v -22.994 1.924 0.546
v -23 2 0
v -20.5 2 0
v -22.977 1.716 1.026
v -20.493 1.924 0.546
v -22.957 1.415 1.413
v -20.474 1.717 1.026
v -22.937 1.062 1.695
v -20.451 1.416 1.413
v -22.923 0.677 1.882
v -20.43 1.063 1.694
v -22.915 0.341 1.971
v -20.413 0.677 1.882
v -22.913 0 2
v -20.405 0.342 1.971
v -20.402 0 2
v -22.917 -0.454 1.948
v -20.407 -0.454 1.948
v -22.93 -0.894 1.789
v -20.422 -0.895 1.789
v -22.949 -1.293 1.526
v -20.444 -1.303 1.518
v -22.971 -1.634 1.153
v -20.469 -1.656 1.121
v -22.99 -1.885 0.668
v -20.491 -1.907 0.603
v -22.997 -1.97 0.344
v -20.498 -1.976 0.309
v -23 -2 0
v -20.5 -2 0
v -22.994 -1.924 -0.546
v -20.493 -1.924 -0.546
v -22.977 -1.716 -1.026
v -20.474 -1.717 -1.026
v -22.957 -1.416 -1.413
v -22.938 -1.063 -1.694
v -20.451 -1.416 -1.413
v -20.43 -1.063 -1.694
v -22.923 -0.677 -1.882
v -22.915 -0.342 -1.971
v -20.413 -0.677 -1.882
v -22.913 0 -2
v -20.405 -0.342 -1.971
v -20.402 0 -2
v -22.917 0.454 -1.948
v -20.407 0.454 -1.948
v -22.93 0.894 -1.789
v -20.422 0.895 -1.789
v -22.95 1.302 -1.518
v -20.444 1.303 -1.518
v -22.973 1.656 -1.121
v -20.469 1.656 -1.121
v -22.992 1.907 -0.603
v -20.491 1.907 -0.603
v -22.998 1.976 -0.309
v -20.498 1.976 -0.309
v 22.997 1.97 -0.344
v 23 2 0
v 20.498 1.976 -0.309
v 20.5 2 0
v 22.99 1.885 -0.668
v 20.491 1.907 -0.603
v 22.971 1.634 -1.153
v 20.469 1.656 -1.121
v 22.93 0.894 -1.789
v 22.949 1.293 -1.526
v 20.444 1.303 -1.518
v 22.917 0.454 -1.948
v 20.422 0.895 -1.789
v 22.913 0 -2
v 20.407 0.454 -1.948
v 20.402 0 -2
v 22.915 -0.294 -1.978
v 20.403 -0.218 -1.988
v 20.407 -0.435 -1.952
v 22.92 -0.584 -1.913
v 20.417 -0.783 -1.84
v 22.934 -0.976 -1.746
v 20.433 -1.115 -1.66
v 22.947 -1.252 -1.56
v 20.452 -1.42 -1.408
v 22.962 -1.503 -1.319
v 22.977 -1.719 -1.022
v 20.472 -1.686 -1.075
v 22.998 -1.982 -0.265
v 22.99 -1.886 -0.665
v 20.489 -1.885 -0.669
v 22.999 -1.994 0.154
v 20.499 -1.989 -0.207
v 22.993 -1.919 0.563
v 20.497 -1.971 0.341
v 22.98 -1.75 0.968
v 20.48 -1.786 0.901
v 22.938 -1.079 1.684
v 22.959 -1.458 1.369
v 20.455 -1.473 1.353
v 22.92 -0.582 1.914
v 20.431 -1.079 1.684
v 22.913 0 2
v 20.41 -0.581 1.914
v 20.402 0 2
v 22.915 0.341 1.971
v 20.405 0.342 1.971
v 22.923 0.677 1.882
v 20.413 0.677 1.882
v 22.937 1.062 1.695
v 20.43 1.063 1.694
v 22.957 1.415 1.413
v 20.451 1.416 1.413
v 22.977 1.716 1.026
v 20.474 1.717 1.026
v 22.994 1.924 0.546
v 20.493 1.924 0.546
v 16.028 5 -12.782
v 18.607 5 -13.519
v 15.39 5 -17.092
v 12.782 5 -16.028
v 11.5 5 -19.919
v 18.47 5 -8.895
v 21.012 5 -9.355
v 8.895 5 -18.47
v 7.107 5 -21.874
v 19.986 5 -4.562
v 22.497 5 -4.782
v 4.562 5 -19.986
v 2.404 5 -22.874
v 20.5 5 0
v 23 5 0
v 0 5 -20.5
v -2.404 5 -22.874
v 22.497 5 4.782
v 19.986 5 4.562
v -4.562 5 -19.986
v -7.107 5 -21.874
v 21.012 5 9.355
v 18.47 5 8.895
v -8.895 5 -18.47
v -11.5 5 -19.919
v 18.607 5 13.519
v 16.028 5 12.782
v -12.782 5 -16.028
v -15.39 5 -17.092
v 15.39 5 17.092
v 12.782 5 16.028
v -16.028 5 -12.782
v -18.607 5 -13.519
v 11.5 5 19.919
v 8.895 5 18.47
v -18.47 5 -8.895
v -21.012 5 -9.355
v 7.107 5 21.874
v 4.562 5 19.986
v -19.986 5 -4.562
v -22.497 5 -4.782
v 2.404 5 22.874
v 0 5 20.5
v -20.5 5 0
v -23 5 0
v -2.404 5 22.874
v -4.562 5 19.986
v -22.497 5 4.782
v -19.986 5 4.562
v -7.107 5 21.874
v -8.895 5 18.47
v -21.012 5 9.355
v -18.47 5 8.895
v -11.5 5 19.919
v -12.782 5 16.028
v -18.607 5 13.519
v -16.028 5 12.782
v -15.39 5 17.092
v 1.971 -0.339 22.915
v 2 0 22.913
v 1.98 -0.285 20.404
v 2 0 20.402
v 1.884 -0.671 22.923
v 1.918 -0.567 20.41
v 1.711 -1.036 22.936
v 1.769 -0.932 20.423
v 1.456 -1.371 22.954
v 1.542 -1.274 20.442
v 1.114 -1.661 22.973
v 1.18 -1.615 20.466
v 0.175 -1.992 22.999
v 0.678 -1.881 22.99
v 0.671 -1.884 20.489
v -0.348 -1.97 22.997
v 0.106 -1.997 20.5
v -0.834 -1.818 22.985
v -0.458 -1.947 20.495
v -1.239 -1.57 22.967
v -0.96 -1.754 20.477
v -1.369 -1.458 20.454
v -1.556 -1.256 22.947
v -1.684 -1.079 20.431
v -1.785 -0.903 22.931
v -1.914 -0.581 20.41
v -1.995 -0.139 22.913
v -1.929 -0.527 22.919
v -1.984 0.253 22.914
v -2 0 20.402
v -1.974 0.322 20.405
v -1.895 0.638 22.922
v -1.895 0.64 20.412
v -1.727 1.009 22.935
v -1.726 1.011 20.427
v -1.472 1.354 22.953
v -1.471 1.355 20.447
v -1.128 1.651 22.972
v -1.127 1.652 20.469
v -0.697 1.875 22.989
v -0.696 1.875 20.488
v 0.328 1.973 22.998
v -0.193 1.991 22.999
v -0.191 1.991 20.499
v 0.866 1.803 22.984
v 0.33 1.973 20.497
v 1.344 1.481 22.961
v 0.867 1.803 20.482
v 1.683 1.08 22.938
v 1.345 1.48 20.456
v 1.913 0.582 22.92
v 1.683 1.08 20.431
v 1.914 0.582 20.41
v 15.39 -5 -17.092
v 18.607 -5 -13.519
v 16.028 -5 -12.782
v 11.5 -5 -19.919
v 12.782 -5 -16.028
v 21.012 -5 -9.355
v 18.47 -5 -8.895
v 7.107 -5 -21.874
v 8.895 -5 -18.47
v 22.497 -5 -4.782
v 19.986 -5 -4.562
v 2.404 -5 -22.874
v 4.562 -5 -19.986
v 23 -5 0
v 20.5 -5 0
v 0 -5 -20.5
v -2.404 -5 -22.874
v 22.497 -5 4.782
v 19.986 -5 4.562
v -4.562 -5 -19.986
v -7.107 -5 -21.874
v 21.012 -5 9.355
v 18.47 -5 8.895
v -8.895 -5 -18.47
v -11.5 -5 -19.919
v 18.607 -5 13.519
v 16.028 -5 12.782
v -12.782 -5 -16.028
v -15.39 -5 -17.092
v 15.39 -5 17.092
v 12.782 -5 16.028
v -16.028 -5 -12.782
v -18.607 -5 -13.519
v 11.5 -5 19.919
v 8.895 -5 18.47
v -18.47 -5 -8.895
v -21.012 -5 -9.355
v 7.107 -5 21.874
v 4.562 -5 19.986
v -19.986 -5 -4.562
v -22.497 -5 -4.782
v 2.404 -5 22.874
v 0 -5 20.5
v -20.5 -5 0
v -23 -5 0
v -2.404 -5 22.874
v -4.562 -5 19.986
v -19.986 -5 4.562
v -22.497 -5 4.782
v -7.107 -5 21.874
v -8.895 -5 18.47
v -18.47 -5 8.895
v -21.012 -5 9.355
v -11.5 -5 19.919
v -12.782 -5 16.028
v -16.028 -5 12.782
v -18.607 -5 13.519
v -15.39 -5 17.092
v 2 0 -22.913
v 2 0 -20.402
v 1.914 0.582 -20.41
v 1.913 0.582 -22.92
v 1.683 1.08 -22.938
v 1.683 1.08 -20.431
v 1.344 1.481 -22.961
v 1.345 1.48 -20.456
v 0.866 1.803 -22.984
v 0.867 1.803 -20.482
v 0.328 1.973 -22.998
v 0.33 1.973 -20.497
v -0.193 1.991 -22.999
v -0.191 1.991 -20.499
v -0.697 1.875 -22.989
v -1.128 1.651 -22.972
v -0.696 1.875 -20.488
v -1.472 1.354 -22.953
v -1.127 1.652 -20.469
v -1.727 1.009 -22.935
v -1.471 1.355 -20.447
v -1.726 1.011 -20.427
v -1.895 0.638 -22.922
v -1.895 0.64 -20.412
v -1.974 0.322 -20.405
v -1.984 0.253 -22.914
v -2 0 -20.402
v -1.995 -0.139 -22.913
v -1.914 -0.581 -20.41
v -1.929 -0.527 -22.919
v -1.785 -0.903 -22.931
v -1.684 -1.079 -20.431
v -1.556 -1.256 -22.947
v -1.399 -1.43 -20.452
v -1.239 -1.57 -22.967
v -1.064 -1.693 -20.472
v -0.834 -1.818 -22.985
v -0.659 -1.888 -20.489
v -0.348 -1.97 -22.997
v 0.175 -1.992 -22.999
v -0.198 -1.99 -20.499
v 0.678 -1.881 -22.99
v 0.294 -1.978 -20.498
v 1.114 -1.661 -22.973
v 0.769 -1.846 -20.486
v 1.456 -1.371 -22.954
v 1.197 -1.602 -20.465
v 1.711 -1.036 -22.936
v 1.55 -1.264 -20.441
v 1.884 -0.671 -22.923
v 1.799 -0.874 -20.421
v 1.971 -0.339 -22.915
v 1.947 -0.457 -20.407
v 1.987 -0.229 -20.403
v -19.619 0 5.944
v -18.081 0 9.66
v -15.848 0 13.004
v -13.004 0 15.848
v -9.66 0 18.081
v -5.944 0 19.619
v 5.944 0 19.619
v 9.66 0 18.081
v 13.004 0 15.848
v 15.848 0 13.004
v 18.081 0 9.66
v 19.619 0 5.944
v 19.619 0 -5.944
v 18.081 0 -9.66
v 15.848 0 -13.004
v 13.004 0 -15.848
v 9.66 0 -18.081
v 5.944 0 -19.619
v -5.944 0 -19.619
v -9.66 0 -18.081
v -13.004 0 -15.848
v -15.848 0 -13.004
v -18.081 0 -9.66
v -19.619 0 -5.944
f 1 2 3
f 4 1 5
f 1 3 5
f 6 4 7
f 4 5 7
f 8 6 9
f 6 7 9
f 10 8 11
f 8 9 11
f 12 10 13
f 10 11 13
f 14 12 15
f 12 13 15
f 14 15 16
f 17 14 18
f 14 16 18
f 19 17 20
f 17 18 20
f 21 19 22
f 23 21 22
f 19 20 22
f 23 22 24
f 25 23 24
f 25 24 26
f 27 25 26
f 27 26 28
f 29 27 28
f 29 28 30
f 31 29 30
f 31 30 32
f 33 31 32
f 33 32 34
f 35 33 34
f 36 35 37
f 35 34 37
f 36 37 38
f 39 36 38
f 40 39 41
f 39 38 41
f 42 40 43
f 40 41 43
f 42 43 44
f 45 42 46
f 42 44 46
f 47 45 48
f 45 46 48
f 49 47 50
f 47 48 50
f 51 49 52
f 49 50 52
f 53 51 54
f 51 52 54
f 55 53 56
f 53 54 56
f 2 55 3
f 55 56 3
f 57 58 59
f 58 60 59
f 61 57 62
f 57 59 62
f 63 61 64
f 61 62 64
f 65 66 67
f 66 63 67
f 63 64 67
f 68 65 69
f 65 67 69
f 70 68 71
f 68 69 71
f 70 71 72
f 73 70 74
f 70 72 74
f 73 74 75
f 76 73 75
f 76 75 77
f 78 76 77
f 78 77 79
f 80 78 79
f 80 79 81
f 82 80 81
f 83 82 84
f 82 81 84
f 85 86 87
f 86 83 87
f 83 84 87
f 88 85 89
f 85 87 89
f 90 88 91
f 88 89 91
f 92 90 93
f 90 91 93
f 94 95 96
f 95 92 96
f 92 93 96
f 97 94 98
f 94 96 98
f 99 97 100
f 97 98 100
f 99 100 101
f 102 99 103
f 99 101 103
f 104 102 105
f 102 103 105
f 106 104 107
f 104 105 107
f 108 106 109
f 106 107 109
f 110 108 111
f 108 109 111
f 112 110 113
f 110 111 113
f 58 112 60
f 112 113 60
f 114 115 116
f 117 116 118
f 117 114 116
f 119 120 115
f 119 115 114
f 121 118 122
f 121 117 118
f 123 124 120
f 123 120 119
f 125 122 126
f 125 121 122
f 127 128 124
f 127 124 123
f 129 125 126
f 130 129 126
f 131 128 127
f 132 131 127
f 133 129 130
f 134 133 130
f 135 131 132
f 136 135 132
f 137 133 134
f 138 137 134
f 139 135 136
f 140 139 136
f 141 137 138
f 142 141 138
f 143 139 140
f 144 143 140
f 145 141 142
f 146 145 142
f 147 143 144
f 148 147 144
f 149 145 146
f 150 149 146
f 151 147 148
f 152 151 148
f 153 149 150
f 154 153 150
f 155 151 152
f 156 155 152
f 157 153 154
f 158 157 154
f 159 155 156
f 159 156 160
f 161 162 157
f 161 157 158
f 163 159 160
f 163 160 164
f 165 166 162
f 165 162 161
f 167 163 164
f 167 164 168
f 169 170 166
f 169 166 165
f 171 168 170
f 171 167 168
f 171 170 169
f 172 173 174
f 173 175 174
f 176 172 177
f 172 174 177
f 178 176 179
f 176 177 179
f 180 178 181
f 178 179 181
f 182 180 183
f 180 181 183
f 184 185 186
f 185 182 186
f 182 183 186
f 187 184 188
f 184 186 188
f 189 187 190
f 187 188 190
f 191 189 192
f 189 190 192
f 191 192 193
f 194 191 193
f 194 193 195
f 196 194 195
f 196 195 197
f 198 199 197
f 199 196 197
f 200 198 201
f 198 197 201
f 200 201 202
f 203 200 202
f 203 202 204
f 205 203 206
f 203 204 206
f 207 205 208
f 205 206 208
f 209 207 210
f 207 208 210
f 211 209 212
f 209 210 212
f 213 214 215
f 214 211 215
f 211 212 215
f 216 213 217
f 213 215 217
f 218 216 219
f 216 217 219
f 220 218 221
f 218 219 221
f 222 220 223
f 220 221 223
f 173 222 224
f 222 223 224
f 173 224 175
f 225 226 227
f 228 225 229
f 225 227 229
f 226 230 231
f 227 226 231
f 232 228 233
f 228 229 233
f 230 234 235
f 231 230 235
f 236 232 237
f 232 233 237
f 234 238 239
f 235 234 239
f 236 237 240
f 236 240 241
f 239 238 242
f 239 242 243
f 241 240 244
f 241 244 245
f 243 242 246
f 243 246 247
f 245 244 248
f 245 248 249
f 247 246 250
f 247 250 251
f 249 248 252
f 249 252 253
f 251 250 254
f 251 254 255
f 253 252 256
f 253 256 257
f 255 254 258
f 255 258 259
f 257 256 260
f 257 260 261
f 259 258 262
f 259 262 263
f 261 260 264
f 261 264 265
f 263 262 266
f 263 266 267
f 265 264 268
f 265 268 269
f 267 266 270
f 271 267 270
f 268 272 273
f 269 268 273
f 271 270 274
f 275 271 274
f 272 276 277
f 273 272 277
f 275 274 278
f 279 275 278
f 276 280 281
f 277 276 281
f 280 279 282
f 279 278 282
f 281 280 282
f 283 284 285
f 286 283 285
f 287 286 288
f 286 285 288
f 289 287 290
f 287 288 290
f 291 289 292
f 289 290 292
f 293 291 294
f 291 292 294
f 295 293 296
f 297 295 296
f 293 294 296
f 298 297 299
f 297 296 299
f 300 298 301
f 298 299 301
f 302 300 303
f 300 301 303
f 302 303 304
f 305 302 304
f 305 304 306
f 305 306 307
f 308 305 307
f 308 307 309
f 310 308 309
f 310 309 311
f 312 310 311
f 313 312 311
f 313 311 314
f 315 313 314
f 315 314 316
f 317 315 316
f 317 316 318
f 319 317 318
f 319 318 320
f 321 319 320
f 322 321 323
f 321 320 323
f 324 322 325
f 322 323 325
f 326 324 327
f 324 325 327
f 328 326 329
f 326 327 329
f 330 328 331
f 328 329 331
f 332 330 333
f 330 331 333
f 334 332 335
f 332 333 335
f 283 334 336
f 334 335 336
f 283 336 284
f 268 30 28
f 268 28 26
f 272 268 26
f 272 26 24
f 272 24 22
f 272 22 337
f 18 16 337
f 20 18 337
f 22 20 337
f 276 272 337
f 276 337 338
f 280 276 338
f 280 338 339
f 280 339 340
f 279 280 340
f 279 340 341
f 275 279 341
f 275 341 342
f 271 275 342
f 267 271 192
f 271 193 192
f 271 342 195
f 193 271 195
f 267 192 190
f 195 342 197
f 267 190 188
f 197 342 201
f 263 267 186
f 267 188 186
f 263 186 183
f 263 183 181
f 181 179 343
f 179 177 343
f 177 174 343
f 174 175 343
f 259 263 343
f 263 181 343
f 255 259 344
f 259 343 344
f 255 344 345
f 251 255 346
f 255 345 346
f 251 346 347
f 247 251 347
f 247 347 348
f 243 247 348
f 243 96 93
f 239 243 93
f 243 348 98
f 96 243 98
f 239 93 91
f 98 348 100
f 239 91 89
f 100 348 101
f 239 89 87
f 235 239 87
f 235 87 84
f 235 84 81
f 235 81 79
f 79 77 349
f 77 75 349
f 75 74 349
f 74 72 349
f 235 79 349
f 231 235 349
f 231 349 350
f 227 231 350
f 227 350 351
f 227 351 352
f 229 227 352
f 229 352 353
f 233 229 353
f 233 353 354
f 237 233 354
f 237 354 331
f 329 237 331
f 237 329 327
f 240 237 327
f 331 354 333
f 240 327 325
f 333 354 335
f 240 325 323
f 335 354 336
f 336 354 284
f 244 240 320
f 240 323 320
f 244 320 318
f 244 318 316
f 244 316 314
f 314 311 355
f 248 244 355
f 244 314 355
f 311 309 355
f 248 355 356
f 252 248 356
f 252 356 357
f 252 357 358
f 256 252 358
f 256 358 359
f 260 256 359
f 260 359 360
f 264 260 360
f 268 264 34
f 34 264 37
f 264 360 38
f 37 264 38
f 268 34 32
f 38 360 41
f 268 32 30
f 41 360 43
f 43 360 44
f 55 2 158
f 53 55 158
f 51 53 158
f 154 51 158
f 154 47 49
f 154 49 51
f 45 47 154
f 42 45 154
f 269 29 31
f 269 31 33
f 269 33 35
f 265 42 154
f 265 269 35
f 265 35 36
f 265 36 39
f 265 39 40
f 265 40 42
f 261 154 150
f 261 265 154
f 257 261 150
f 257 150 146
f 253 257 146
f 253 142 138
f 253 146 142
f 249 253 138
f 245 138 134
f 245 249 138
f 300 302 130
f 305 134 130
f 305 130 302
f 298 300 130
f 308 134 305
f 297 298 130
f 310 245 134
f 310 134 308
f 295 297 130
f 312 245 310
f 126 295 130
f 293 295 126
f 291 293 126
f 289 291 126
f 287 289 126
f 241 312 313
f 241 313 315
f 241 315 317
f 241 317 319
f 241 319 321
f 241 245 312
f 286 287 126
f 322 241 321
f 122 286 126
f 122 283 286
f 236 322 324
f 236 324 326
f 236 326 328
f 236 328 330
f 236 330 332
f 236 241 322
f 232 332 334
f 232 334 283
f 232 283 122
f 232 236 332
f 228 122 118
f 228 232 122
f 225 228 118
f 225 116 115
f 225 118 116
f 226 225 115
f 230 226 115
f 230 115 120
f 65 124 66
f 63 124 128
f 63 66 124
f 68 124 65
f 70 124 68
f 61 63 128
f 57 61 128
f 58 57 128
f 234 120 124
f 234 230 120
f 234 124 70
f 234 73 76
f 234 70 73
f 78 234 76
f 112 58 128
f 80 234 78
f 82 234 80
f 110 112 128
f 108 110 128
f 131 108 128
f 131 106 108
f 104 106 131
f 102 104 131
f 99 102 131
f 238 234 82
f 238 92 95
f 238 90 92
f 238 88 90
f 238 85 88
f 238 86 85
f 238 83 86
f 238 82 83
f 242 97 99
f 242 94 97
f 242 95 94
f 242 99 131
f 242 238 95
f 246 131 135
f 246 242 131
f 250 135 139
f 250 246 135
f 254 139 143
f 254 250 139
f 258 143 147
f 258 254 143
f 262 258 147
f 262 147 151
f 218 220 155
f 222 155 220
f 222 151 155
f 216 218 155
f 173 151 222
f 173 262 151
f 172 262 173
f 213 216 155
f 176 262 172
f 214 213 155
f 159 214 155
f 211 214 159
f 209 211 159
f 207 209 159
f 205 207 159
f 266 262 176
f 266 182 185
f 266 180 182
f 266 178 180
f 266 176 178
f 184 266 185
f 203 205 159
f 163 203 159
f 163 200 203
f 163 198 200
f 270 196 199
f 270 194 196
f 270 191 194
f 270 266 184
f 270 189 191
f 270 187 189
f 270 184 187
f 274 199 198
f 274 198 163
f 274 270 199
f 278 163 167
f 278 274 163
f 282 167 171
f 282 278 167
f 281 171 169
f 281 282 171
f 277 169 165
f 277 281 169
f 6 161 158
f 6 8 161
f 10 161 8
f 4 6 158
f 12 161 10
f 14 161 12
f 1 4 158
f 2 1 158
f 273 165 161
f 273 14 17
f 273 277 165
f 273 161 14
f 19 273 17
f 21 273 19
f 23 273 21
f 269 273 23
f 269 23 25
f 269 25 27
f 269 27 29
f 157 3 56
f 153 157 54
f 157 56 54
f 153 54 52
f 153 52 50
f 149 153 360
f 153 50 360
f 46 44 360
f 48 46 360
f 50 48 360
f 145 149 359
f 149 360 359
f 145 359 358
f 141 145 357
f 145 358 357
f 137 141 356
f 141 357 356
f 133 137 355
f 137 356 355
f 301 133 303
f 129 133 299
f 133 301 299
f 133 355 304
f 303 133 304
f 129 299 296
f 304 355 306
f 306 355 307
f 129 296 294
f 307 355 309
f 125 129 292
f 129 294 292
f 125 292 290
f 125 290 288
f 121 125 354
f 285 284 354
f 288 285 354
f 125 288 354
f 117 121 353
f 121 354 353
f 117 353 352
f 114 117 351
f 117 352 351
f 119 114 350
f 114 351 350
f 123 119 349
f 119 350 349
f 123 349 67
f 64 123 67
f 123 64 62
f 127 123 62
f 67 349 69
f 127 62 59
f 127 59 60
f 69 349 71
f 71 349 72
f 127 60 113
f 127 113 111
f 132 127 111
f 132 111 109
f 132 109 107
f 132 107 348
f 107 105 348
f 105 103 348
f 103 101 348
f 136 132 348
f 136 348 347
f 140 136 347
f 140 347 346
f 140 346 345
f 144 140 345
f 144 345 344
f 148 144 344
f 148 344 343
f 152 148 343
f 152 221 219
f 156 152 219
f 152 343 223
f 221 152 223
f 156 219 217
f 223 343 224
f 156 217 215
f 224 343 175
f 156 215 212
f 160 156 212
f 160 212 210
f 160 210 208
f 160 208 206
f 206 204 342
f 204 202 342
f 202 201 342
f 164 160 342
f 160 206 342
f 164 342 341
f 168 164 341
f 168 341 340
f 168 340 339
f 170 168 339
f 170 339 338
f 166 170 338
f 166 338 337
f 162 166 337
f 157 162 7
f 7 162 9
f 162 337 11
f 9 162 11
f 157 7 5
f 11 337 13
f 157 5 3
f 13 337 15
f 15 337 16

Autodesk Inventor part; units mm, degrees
ref_plane "YZ Plane" through (0, 0, 0) normal (1, 0, 0) x (0, 1, 0)
ref_plane "XZ Plane" through (0, 0, 0) normal (0, 1, 0) x (-1, 0, 0)
ref_plane "XY Plane" through (0, 0, 0) normal (0, 0, 1) x (1, 0, 0)
sketch "Sketch1" plane through (0, 0, 0) normal (0, 1, 0) x (-1, 0, 0)
  circle A0 centre (0, 0) radius 20.5
  circle A1 centre (0, 0) radius 23
  dimension "d2" = 41
  dimension "d3" = 46
extrude "Extrusion1" add sketch "Sketch1" along normal mid plane 10
sketch "Sketch2" plane through (0, 0, 0) normal (1, 0, 0) x (0, 1, 0)
  circle A0 centre (0, 0) radius 2
  dimension "d6" = 4
extrude "Extrusion2" cut sketch "Sketch2" along normal through all both and the other way through all
sketch "Sketch3" plane through (0, 0, 0) normal (0, 0, 1) x (1, 0, 0)
  circle A0 centre (0, 0) radius 2
  dimension "d9" = 4
extrude "Extrusion3" cut sketch "Sketch3" along normal through all both and the other way through all
